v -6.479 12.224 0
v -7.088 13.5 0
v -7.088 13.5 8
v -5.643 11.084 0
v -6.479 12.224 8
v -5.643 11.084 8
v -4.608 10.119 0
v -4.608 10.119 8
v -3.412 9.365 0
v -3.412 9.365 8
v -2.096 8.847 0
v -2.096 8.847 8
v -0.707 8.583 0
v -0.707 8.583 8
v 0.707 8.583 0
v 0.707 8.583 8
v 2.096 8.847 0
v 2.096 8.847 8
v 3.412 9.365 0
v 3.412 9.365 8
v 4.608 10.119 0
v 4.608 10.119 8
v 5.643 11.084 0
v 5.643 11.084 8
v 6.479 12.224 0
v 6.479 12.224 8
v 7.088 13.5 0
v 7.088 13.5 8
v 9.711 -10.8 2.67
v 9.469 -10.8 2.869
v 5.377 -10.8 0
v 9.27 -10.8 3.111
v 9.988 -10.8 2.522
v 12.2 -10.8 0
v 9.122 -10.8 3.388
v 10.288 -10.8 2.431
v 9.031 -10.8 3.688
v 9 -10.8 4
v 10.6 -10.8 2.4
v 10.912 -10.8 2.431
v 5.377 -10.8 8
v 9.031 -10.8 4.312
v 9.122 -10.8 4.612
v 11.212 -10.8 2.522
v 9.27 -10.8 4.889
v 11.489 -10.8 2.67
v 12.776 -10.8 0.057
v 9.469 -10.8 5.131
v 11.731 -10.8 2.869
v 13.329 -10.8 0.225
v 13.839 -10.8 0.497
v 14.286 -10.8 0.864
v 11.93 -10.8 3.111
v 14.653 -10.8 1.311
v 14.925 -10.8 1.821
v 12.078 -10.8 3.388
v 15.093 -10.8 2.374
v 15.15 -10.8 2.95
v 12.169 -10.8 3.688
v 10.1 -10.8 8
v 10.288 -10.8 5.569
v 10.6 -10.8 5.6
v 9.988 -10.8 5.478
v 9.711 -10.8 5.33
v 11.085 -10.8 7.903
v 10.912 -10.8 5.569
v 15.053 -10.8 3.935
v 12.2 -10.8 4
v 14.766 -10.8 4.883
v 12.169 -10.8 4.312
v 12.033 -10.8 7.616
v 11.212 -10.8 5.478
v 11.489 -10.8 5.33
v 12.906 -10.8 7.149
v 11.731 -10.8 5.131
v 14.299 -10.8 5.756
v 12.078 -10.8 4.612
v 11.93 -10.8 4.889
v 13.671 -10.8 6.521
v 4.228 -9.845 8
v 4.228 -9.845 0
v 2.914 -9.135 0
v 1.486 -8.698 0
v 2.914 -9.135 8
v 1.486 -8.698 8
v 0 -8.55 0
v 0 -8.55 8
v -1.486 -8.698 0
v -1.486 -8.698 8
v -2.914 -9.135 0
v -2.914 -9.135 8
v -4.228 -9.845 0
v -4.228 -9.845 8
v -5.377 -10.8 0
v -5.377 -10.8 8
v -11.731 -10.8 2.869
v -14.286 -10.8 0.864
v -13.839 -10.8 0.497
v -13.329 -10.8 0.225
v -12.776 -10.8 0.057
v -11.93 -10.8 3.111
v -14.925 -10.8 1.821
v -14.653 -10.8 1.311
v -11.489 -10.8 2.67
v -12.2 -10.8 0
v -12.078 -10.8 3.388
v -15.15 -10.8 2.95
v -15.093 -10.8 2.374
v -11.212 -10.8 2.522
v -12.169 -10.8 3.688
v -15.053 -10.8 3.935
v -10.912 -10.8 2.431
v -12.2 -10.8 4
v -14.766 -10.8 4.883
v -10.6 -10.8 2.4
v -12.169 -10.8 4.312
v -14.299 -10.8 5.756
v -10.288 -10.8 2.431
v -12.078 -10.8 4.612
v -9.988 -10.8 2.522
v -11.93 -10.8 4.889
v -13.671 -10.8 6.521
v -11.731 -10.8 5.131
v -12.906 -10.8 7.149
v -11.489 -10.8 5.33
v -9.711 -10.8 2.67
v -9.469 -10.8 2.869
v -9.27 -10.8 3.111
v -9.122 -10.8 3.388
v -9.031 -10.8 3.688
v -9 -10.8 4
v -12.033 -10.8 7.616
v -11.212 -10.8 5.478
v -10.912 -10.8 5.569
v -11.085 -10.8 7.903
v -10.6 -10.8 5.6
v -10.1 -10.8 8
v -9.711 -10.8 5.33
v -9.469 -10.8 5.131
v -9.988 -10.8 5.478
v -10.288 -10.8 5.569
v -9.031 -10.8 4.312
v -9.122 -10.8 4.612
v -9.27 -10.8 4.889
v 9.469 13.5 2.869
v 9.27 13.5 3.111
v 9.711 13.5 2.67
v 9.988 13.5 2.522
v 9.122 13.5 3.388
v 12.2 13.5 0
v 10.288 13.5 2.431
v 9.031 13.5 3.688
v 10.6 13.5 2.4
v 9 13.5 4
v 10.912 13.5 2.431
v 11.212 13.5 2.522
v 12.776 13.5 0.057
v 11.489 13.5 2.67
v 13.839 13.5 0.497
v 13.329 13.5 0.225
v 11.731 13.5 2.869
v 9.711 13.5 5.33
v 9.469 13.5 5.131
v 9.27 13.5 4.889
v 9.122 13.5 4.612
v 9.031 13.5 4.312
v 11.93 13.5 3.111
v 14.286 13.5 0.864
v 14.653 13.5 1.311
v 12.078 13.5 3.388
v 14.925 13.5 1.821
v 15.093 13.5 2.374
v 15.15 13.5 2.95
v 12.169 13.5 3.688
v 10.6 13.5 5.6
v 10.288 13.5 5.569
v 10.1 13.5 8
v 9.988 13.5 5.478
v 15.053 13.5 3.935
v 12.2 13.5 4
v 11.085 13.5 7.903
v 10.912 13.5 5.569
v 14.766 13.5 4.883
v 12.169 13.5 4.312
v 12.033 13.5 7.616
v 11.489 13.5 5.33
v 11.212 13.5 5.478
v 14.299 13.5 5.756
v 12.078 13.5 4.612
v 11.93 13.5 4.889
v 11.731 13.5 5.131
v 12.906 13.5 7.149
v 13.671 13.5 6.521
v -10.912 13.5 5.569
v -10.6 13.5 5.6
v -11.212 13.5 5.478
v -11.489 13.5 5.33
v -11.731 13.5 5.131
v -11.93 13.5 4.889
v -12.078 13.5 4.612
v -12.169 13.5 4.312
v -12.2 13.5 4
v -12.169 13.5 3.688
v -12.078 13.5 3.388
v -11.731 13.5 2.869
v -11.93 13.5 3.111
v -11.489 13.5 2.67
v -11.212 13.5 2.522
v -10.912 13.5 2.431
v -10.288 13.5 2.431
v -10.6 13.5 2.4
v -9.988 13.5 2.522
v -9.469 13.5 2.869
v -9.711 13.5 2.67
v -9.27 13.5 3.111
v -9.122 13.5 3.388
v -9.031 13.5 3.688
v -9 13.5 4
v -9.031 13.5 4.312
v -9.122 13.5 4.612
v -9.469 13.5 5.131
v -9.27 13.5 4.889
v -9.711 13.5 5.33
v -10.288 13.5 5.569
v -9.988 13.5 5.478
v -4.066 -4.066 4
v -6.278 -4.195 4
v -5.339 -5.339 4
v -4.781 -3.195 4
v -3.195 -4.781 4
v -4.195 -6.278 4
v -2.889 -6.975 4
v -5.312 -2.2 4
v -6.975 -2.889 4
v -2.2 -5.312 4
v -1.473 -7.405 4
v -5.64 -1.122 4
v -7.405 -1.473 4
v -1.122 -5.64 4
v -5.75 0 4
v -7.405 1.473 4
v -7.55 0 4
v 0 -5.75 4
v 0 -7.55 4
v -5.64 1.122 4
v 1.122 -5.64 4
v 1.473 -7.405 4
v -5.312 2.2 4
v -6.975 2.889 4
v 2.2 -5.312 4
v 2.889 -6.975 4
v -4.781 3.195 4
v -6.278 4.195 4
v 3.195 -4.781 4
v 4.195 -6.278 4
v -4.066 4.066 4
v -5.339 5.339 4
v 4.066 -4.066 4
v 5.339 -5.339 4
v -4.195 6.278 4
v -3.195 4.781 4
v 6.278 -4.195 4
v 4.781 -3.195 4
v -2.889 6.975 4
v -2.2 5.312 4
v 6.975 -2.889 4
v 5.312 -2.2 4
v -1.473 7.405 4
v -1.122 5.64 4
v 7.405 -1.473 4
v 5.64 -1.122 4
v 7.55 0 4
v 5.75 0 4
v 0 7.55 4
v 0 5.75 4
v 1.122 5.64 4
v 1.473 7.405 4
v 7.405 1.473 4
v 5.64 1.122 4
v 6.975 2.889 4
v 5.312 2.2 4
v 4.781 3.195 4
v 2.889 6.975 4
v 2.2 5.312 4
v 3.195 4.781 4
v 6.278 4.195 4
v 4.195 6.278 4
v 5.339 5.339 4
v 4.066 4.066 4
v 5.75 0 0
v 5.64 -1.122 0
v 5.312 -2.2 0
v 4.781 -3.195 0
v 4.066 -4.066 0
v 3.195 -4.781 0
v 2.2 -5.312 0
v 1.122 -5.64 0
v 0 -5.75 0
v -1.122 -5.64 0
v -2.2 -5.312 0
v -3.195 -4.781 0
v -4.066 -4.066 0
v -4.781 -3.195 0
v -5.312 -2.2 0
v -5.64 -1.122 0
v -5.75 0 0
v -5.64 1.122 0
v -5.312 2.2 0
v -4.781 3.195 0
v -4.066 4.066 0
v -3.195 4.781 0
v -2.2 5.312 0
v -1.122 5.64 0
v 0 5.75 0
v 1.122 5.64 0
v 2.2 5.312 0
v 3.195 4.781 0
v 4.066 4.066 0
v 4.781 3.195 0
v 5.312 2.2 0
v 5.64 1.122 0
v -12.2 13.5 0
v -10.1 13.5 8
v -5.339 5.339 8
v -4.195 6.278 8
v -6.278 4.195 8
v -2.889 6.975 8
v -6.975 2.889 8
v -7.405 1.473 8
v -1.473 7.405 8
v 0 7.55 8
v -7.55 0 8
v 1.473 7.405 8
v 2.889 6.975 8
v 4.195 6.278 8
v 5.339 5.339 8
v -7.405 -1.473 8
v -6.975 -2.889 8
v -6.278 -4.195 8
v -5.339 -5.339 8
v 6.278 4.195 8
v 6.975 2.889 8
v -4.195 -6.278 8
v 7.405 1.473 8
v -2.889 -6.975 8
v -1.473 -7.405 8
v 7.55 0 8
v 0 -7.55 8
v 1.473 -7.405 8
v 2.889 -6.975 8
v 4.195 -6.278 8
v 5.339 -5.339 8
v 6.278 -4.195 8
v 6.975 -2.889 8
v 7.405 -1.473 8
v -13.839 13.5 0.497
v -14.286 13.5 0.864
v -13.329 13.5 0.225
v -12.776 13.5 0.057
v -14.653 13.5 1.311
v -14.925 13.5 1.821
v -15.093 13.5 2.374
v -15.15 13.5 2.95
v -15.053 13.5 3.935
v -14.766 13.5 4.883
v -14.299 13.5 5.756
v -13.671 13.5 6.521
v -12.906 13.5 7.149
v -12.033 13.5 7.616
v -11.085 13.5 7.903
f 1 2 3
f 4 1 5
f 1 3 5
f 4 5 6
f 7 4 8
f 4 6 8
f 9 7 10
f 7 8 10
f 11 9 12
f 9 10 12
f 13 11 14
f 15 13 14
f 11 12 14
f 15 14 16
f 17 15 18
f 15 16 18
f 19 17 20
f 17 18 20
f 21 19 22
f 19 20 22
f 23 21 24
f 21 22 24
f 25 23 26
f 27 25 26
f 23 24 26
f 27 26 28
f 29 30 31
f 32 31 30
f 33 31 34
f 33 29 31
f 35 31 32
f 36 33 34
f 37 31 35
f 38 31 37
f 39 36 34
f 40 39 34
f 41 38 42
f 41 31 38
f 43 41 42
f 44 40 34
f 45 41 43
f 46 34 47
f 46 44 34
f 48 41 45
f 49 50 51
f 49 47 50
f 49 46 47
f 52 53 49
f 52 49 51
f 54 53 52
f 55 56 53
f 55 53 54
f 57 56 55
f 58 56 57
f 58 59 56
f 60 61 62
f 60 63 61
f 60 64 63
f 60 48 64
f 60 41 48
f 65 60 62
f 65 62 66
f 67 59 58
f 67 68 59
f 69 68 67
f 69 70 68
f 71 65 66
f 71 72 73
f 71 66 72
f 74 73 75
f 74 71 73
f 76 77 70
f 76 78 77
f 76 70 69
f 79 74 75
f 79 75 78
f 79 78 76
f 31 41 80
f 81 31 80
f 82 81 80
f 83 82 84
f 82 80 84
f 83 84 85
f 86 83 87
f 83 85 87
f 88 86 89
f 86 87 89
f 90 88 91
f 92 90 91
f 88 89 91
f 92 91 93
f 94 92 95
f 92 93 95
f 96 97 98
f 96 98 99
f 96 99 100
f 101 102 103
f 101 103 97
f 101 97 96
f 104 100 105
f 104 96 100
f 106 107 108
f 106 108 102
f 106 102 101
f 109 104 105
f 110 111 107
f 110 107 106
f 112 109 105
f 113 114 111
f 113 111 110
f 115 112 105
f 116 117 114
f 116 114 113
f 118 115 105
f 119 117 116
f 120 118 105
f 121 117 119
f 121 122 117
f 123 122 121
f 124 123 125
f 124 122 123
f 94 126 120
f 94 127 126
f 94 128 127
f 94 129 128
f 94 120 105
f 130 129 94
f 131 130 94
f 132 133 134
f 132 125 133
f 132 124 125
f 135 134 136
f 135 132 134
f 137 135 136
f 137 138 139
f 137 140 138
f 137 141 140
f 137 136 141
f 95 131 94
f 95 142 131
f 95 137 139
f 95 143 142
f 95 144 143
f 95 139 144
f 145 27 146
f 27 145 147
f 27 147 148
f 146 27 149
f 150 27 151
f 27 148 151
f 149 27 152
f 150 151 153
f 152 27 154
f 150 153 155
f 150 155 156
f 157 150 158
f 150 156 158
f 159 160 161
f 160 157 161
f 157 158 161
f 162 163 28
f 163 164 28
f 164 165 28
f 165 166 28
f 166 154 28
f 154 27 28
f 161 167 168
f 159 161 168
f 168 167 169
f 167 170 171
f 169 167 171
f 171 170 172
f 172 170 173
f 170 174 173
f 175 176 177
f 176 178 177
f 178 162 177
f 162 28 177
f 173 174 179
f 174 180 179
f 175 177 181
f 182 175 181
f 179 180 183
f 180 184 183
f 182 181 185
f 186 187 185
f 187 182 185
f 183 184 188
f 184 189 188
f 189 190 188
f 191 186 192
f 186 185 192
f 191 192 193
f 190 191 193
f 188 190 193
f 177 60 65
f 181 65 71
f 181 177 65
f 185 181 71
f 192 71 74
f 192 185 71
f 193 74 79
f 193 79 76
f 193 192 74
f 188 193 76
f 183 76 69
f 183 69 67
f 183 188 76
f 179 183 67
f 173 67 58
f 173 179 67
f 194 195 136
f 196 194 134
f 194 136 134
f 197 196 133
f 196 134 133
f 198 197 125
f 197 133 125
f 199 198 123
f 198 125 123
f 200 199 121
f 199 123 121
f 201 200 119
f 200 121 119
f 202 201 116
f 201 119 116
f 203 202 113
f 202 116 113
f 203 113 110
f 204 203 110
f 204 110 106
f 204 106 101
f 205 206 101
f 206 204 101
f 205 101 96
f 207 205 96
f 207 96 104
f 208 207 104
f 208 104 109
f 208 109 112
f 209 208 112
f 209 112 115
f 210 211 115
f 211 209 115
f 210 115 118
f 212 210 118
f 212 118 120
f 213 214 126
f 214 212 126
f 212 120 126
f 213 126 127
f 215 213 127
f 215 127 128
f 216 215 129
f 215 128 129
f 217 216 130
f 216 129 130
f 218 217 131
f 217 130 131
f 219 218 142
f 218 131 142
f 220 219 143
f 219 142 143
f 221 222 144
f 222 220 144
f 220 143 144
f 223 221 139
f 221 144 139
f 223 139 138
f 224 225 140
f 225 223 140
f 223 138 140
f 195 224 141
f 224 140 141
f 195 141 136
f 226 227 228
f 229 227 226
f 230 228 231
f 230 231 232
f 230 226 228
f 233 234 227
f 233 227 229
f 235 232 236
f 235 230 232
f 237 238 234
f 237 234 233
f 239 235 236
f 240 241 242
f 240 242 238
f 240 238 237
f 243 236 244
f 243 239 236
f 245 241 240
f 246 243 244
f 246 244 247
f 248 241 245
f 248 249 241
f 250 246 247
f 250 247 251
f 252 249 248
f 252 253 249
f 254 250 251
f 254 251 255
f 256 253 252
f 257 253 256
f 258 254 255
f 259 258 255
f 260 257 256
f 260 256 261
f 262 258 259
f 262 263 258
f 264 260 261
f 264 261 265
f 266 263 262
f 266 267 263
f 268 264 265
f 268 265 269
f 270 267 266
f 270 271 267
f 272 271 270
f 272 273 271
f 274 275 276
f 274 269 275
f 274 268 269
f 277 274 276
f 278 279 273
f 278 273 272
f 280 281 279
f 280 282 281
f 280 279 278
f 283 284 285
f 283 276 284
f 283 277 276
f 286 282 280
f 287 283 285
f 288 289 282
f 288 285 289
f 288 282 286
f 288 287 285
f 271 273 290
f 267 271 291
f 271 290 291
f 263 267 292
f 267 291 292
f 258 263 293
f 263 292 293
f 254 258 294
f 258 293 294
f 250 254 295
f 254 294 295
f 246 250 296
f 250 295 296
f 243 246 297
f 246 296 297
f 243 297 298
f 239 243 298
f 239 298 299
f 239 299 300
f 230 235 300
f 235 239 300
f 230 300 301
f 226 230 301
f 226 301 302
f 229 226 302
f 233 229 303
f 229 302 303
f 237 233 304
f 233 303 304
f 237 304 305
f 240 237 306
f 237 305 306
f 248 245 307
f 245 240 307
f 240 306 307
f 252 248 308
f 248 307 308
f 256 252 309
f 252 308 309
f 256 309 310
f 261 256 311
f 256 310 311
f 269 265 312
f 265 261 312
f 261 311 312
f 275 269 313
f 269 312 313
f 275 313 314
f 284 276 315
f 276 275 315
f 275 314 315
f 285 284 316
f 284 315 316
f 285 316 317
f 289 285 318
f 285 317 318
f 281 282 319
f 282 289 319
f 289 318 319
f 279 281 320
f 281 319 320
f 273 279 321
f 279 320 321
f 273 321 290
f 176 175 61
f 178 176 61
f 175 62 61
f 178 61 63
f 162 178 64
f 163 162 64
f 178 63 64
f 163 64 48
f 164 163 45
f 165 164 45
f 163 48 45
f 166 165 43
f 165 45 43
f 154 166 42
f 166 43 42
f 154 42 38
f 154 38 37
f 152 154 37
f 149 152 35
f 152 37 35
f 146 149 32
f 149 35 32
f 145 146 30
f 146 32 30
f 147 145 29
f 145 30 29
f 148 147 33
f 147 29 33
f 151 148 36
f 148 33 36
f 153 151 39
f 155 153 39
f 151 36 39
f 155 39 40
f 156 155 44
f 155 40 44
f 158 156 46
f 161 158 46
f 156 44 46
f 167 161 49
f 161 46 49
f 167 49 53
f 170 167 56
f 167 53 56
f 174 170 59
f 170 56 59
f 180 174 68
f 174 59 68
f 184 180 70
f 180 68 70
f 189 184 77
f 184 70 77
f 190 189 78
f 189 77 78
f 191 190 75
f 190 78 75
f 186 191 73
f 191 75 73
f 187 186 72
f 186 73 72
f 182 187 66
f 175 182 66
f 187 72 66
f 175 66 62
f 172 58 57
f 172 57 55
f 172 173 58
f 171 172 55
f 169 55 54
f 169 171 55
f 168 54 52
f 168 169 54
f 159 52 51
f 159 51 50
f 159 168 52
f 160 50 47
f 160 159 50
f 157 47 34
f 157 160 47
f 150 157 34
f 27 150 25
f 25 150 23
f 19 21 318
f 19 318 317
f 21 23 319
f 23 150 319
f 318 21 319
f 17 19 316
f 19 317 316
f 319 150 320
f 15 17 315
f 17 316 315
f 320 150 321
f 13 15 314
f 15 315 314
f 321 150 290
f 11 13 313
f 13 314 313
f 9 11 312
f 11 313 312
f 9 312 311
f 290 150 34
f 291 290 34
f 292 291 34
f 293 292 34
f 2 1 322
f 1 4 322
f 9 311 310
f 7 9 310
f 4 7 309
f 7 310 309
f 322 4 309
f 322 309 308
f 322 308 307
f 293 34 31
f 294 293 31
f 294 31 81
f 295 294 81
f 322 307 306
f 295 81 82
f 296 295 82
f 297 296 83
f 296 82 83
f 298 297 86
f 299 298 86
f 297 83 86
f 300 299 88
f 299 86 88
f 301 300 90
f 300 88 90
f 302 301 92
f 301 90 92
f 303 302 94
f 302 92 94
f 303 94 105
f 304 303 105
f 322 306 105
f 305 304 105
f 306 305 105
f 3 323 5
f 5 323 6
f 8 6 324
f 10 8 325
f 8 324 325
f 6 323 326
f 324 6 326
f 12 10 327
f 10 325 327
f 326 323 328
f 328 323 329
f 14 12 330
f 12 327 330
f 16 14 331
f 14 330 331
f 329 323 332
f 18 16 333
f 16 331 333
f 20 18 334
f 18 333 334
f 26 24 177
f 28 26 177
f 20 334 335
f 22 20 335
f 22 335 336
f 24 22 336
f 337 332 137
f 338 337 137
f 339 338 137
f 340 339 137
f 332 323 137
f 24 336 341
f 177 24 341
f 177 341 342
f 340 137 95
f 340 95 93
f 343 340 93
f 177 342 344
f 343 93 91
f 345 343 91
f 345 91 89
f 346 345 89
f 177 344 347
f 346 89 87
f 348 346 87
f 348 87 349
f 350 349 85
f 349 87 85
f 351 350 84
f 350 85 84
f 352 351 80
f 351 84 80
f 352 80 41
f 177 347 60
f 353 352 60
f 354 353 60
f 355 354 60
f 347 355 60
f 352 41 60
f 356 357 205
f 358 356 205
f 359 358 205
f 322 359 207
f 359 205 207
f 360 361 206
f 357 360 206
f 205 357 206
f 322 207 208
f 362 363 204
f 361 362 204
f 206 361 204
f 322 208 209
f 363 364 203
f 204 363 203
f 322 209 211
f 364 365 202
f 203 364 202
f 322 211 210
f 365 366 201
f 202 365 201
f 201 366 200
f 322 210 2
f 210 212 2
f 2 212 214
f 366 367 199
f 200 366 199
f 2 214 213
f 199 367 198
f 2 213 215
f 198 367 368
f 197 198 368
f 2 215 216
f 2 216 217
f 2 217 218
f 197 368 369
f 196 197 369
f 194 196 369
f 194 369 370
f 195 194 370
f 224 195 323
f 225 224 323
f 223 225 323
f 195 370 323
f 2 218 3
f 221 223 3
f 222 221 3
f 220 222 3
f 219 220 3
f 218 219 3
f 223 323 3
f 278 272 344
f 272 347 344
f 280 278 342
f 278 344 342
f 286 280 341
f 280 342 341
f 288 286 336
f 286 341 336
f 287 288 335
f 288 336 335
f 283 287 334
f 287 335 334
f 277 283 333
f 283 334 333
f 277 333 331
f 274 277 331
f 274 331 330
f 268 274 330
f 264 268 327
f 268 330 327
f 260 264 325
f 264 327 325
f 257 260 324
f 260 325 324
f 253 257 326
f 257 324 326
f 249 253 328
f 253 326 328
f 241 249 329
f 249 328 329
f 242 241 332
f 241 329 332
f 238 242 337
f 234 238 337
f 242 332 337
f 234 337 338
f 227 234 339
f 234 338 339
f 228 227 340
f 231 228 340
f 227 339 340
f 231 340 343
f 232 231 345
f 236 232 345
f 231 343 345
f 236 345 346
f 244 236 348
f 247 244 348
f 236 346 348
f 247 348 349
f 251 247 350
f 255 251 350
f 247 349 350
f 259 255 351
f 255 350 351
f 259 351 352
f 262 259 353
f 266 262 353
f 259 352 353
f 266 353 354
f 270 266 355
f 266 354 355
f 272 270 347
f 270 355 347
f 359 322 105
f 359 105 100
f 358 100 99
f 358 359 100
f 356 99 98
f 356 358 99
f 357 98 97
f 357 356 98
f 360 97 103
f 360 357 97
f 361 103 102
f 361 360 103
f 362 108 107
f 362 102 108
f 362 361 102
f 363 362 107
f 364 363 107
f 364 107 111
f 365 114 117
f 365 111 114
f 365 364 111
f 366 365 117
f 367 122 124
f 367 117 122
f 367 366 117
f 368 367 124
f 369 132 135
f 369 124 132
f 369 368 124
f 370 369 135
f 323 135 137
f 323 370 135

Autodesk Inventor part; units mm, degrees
ref_plane "YZ Plane" through (0, 0, 0) normal (1, 0, 0) x (0, 1, 0)
ref_plane "XZ Plane" through (0, 0, 0) normal (0, 1, 0) x (-1, 0, 0)
sketch "Эскиз1" plane through (0, 0, 0) normal (0, 0, 1) x (1, 0, 0)
  circle A0 centre (0, 0) radius 5.75
  circle A1 centre (0, 0) radius 9.55
  line L0 (9.55, 13.5) -> (-9.55, 13.5)
  line L1 (-9.55, 13.5) -> (-9.55, 0)
  line L2 (-9.55, 0) -> (9.55, 0)
  line L3 (9.55, 0) -> (9.55, 13.5)
  line L4 (9.55, 0) -> (-9.55, 0)
  line L5 (-9.55, 0) -> (-9.55, -10.8)
  line L6 (-9.55, -10.8) -> (9.55, -10.8)
  line L7 (9.55, -10.8) -> (9.55, 0)
  point P0 (9.55, 0)
  point P1 (0, 9.55)
  point P2 (-9.55, 0)
  point P3 (9.55, 0)
  point P4 (-9.55, 0)
  dimension "d0" = 11.5
  dimension "d1" = 19.1
  dimension "d64" = 10.8
  dimension "d85" = 13.5
extrude "Выдавливание1" add sketch "Эскиз1" along normal blind 8 contours L2 A1 A0 | A0 L2 A1 | L7 L6 L5 A1 | A1 L1 L0 L3
sketch "Эскиз15" plane through (0, 0, 8) normal (0, 0, 1) x (1, 0, 0)
  circle A0 centre (0, 0) radius 5.75 projected
  circle A1 centre (0, 0) radius 7.55
  dimension "d67" = 15.1
extrude "Выдавливание9" cut sketch "Эскиз15" against normal blind 4
ref_plane "РабПлоскость6" through (0, -10.8, 0) normal (1, 0, 0) x (0, 0, -1)
sketch "Эскиз16" plane through (-9.55, -10.8, 0) normal (0, -1, 0) x (1, 0, 0)
  line L0 (0, 8) -> (19.1, 8) projected
  line L1 (19.1, 8) -> (24.7, 8)
  line L2 (24.7, 8) -> (24.7, 0)
  line L3 (24.7, 0) -> (19.1, 0)
  line L4 (19.1, 0) -> (19.1, 8)
  point P0 (9.55, 0)
  dimension "d70" = 5.6
  dimension "d71" = 8
extrude "Выдавливание10" add sketch "Эскиз16" against normal up to surface (24.3 mm away)
sketch "Эскиз17" plane through (-9.55, 13.5, 0) normal (0, 1, 0) x (1, 0, 0)
  line L0 (24.7, 0) -> (24.7, -8) projected
  line L1 (24.7, -4) -> (20.15, -4)
  point P0 (9.55, 0)
  dimension "d82" = 4.55
hole "Отверстие4" at (10.6, 13.5, 4) direction (0, -1, 0) diameter 3.2 end through all
fillet "Сопряжение5" radius 5.05 1 edges at (15.15, 1.35, 8)
fillet "Сопряжение5" radius 2.95 1 edges at (15.15, 1.35, 0)
mirror "Зеркальное отражение5" about plane through (0, -10.8, 0) normal (1, 0, 0) of "Сопряжение5", "Отверстие4", "Выдавливание10"
sketch "Эскиз18" plane through (0, 0, 8) normal (0, 0, 1) x (1, 0, 0)
  circle A0 centre (0, 0) radius 7.55 projected
  circle A1 centre (0, 16.1) radius 7.55
  circle A2 centre (0, -16.1) radius 7.55
  dimension "d86" = 16.1
  dimension "d87" = 16.1
extrude "Выдавливание11" cut sketch "Эскиз18" against normal through all contours A1 | A2
ref_plane "РабПлоскость7" through (0, -10.8, 0) normal (1, 0, 0) x (0, 0, -1)
equation "\"d87\" = d86"
properties part number "Крепление дифференциала"
